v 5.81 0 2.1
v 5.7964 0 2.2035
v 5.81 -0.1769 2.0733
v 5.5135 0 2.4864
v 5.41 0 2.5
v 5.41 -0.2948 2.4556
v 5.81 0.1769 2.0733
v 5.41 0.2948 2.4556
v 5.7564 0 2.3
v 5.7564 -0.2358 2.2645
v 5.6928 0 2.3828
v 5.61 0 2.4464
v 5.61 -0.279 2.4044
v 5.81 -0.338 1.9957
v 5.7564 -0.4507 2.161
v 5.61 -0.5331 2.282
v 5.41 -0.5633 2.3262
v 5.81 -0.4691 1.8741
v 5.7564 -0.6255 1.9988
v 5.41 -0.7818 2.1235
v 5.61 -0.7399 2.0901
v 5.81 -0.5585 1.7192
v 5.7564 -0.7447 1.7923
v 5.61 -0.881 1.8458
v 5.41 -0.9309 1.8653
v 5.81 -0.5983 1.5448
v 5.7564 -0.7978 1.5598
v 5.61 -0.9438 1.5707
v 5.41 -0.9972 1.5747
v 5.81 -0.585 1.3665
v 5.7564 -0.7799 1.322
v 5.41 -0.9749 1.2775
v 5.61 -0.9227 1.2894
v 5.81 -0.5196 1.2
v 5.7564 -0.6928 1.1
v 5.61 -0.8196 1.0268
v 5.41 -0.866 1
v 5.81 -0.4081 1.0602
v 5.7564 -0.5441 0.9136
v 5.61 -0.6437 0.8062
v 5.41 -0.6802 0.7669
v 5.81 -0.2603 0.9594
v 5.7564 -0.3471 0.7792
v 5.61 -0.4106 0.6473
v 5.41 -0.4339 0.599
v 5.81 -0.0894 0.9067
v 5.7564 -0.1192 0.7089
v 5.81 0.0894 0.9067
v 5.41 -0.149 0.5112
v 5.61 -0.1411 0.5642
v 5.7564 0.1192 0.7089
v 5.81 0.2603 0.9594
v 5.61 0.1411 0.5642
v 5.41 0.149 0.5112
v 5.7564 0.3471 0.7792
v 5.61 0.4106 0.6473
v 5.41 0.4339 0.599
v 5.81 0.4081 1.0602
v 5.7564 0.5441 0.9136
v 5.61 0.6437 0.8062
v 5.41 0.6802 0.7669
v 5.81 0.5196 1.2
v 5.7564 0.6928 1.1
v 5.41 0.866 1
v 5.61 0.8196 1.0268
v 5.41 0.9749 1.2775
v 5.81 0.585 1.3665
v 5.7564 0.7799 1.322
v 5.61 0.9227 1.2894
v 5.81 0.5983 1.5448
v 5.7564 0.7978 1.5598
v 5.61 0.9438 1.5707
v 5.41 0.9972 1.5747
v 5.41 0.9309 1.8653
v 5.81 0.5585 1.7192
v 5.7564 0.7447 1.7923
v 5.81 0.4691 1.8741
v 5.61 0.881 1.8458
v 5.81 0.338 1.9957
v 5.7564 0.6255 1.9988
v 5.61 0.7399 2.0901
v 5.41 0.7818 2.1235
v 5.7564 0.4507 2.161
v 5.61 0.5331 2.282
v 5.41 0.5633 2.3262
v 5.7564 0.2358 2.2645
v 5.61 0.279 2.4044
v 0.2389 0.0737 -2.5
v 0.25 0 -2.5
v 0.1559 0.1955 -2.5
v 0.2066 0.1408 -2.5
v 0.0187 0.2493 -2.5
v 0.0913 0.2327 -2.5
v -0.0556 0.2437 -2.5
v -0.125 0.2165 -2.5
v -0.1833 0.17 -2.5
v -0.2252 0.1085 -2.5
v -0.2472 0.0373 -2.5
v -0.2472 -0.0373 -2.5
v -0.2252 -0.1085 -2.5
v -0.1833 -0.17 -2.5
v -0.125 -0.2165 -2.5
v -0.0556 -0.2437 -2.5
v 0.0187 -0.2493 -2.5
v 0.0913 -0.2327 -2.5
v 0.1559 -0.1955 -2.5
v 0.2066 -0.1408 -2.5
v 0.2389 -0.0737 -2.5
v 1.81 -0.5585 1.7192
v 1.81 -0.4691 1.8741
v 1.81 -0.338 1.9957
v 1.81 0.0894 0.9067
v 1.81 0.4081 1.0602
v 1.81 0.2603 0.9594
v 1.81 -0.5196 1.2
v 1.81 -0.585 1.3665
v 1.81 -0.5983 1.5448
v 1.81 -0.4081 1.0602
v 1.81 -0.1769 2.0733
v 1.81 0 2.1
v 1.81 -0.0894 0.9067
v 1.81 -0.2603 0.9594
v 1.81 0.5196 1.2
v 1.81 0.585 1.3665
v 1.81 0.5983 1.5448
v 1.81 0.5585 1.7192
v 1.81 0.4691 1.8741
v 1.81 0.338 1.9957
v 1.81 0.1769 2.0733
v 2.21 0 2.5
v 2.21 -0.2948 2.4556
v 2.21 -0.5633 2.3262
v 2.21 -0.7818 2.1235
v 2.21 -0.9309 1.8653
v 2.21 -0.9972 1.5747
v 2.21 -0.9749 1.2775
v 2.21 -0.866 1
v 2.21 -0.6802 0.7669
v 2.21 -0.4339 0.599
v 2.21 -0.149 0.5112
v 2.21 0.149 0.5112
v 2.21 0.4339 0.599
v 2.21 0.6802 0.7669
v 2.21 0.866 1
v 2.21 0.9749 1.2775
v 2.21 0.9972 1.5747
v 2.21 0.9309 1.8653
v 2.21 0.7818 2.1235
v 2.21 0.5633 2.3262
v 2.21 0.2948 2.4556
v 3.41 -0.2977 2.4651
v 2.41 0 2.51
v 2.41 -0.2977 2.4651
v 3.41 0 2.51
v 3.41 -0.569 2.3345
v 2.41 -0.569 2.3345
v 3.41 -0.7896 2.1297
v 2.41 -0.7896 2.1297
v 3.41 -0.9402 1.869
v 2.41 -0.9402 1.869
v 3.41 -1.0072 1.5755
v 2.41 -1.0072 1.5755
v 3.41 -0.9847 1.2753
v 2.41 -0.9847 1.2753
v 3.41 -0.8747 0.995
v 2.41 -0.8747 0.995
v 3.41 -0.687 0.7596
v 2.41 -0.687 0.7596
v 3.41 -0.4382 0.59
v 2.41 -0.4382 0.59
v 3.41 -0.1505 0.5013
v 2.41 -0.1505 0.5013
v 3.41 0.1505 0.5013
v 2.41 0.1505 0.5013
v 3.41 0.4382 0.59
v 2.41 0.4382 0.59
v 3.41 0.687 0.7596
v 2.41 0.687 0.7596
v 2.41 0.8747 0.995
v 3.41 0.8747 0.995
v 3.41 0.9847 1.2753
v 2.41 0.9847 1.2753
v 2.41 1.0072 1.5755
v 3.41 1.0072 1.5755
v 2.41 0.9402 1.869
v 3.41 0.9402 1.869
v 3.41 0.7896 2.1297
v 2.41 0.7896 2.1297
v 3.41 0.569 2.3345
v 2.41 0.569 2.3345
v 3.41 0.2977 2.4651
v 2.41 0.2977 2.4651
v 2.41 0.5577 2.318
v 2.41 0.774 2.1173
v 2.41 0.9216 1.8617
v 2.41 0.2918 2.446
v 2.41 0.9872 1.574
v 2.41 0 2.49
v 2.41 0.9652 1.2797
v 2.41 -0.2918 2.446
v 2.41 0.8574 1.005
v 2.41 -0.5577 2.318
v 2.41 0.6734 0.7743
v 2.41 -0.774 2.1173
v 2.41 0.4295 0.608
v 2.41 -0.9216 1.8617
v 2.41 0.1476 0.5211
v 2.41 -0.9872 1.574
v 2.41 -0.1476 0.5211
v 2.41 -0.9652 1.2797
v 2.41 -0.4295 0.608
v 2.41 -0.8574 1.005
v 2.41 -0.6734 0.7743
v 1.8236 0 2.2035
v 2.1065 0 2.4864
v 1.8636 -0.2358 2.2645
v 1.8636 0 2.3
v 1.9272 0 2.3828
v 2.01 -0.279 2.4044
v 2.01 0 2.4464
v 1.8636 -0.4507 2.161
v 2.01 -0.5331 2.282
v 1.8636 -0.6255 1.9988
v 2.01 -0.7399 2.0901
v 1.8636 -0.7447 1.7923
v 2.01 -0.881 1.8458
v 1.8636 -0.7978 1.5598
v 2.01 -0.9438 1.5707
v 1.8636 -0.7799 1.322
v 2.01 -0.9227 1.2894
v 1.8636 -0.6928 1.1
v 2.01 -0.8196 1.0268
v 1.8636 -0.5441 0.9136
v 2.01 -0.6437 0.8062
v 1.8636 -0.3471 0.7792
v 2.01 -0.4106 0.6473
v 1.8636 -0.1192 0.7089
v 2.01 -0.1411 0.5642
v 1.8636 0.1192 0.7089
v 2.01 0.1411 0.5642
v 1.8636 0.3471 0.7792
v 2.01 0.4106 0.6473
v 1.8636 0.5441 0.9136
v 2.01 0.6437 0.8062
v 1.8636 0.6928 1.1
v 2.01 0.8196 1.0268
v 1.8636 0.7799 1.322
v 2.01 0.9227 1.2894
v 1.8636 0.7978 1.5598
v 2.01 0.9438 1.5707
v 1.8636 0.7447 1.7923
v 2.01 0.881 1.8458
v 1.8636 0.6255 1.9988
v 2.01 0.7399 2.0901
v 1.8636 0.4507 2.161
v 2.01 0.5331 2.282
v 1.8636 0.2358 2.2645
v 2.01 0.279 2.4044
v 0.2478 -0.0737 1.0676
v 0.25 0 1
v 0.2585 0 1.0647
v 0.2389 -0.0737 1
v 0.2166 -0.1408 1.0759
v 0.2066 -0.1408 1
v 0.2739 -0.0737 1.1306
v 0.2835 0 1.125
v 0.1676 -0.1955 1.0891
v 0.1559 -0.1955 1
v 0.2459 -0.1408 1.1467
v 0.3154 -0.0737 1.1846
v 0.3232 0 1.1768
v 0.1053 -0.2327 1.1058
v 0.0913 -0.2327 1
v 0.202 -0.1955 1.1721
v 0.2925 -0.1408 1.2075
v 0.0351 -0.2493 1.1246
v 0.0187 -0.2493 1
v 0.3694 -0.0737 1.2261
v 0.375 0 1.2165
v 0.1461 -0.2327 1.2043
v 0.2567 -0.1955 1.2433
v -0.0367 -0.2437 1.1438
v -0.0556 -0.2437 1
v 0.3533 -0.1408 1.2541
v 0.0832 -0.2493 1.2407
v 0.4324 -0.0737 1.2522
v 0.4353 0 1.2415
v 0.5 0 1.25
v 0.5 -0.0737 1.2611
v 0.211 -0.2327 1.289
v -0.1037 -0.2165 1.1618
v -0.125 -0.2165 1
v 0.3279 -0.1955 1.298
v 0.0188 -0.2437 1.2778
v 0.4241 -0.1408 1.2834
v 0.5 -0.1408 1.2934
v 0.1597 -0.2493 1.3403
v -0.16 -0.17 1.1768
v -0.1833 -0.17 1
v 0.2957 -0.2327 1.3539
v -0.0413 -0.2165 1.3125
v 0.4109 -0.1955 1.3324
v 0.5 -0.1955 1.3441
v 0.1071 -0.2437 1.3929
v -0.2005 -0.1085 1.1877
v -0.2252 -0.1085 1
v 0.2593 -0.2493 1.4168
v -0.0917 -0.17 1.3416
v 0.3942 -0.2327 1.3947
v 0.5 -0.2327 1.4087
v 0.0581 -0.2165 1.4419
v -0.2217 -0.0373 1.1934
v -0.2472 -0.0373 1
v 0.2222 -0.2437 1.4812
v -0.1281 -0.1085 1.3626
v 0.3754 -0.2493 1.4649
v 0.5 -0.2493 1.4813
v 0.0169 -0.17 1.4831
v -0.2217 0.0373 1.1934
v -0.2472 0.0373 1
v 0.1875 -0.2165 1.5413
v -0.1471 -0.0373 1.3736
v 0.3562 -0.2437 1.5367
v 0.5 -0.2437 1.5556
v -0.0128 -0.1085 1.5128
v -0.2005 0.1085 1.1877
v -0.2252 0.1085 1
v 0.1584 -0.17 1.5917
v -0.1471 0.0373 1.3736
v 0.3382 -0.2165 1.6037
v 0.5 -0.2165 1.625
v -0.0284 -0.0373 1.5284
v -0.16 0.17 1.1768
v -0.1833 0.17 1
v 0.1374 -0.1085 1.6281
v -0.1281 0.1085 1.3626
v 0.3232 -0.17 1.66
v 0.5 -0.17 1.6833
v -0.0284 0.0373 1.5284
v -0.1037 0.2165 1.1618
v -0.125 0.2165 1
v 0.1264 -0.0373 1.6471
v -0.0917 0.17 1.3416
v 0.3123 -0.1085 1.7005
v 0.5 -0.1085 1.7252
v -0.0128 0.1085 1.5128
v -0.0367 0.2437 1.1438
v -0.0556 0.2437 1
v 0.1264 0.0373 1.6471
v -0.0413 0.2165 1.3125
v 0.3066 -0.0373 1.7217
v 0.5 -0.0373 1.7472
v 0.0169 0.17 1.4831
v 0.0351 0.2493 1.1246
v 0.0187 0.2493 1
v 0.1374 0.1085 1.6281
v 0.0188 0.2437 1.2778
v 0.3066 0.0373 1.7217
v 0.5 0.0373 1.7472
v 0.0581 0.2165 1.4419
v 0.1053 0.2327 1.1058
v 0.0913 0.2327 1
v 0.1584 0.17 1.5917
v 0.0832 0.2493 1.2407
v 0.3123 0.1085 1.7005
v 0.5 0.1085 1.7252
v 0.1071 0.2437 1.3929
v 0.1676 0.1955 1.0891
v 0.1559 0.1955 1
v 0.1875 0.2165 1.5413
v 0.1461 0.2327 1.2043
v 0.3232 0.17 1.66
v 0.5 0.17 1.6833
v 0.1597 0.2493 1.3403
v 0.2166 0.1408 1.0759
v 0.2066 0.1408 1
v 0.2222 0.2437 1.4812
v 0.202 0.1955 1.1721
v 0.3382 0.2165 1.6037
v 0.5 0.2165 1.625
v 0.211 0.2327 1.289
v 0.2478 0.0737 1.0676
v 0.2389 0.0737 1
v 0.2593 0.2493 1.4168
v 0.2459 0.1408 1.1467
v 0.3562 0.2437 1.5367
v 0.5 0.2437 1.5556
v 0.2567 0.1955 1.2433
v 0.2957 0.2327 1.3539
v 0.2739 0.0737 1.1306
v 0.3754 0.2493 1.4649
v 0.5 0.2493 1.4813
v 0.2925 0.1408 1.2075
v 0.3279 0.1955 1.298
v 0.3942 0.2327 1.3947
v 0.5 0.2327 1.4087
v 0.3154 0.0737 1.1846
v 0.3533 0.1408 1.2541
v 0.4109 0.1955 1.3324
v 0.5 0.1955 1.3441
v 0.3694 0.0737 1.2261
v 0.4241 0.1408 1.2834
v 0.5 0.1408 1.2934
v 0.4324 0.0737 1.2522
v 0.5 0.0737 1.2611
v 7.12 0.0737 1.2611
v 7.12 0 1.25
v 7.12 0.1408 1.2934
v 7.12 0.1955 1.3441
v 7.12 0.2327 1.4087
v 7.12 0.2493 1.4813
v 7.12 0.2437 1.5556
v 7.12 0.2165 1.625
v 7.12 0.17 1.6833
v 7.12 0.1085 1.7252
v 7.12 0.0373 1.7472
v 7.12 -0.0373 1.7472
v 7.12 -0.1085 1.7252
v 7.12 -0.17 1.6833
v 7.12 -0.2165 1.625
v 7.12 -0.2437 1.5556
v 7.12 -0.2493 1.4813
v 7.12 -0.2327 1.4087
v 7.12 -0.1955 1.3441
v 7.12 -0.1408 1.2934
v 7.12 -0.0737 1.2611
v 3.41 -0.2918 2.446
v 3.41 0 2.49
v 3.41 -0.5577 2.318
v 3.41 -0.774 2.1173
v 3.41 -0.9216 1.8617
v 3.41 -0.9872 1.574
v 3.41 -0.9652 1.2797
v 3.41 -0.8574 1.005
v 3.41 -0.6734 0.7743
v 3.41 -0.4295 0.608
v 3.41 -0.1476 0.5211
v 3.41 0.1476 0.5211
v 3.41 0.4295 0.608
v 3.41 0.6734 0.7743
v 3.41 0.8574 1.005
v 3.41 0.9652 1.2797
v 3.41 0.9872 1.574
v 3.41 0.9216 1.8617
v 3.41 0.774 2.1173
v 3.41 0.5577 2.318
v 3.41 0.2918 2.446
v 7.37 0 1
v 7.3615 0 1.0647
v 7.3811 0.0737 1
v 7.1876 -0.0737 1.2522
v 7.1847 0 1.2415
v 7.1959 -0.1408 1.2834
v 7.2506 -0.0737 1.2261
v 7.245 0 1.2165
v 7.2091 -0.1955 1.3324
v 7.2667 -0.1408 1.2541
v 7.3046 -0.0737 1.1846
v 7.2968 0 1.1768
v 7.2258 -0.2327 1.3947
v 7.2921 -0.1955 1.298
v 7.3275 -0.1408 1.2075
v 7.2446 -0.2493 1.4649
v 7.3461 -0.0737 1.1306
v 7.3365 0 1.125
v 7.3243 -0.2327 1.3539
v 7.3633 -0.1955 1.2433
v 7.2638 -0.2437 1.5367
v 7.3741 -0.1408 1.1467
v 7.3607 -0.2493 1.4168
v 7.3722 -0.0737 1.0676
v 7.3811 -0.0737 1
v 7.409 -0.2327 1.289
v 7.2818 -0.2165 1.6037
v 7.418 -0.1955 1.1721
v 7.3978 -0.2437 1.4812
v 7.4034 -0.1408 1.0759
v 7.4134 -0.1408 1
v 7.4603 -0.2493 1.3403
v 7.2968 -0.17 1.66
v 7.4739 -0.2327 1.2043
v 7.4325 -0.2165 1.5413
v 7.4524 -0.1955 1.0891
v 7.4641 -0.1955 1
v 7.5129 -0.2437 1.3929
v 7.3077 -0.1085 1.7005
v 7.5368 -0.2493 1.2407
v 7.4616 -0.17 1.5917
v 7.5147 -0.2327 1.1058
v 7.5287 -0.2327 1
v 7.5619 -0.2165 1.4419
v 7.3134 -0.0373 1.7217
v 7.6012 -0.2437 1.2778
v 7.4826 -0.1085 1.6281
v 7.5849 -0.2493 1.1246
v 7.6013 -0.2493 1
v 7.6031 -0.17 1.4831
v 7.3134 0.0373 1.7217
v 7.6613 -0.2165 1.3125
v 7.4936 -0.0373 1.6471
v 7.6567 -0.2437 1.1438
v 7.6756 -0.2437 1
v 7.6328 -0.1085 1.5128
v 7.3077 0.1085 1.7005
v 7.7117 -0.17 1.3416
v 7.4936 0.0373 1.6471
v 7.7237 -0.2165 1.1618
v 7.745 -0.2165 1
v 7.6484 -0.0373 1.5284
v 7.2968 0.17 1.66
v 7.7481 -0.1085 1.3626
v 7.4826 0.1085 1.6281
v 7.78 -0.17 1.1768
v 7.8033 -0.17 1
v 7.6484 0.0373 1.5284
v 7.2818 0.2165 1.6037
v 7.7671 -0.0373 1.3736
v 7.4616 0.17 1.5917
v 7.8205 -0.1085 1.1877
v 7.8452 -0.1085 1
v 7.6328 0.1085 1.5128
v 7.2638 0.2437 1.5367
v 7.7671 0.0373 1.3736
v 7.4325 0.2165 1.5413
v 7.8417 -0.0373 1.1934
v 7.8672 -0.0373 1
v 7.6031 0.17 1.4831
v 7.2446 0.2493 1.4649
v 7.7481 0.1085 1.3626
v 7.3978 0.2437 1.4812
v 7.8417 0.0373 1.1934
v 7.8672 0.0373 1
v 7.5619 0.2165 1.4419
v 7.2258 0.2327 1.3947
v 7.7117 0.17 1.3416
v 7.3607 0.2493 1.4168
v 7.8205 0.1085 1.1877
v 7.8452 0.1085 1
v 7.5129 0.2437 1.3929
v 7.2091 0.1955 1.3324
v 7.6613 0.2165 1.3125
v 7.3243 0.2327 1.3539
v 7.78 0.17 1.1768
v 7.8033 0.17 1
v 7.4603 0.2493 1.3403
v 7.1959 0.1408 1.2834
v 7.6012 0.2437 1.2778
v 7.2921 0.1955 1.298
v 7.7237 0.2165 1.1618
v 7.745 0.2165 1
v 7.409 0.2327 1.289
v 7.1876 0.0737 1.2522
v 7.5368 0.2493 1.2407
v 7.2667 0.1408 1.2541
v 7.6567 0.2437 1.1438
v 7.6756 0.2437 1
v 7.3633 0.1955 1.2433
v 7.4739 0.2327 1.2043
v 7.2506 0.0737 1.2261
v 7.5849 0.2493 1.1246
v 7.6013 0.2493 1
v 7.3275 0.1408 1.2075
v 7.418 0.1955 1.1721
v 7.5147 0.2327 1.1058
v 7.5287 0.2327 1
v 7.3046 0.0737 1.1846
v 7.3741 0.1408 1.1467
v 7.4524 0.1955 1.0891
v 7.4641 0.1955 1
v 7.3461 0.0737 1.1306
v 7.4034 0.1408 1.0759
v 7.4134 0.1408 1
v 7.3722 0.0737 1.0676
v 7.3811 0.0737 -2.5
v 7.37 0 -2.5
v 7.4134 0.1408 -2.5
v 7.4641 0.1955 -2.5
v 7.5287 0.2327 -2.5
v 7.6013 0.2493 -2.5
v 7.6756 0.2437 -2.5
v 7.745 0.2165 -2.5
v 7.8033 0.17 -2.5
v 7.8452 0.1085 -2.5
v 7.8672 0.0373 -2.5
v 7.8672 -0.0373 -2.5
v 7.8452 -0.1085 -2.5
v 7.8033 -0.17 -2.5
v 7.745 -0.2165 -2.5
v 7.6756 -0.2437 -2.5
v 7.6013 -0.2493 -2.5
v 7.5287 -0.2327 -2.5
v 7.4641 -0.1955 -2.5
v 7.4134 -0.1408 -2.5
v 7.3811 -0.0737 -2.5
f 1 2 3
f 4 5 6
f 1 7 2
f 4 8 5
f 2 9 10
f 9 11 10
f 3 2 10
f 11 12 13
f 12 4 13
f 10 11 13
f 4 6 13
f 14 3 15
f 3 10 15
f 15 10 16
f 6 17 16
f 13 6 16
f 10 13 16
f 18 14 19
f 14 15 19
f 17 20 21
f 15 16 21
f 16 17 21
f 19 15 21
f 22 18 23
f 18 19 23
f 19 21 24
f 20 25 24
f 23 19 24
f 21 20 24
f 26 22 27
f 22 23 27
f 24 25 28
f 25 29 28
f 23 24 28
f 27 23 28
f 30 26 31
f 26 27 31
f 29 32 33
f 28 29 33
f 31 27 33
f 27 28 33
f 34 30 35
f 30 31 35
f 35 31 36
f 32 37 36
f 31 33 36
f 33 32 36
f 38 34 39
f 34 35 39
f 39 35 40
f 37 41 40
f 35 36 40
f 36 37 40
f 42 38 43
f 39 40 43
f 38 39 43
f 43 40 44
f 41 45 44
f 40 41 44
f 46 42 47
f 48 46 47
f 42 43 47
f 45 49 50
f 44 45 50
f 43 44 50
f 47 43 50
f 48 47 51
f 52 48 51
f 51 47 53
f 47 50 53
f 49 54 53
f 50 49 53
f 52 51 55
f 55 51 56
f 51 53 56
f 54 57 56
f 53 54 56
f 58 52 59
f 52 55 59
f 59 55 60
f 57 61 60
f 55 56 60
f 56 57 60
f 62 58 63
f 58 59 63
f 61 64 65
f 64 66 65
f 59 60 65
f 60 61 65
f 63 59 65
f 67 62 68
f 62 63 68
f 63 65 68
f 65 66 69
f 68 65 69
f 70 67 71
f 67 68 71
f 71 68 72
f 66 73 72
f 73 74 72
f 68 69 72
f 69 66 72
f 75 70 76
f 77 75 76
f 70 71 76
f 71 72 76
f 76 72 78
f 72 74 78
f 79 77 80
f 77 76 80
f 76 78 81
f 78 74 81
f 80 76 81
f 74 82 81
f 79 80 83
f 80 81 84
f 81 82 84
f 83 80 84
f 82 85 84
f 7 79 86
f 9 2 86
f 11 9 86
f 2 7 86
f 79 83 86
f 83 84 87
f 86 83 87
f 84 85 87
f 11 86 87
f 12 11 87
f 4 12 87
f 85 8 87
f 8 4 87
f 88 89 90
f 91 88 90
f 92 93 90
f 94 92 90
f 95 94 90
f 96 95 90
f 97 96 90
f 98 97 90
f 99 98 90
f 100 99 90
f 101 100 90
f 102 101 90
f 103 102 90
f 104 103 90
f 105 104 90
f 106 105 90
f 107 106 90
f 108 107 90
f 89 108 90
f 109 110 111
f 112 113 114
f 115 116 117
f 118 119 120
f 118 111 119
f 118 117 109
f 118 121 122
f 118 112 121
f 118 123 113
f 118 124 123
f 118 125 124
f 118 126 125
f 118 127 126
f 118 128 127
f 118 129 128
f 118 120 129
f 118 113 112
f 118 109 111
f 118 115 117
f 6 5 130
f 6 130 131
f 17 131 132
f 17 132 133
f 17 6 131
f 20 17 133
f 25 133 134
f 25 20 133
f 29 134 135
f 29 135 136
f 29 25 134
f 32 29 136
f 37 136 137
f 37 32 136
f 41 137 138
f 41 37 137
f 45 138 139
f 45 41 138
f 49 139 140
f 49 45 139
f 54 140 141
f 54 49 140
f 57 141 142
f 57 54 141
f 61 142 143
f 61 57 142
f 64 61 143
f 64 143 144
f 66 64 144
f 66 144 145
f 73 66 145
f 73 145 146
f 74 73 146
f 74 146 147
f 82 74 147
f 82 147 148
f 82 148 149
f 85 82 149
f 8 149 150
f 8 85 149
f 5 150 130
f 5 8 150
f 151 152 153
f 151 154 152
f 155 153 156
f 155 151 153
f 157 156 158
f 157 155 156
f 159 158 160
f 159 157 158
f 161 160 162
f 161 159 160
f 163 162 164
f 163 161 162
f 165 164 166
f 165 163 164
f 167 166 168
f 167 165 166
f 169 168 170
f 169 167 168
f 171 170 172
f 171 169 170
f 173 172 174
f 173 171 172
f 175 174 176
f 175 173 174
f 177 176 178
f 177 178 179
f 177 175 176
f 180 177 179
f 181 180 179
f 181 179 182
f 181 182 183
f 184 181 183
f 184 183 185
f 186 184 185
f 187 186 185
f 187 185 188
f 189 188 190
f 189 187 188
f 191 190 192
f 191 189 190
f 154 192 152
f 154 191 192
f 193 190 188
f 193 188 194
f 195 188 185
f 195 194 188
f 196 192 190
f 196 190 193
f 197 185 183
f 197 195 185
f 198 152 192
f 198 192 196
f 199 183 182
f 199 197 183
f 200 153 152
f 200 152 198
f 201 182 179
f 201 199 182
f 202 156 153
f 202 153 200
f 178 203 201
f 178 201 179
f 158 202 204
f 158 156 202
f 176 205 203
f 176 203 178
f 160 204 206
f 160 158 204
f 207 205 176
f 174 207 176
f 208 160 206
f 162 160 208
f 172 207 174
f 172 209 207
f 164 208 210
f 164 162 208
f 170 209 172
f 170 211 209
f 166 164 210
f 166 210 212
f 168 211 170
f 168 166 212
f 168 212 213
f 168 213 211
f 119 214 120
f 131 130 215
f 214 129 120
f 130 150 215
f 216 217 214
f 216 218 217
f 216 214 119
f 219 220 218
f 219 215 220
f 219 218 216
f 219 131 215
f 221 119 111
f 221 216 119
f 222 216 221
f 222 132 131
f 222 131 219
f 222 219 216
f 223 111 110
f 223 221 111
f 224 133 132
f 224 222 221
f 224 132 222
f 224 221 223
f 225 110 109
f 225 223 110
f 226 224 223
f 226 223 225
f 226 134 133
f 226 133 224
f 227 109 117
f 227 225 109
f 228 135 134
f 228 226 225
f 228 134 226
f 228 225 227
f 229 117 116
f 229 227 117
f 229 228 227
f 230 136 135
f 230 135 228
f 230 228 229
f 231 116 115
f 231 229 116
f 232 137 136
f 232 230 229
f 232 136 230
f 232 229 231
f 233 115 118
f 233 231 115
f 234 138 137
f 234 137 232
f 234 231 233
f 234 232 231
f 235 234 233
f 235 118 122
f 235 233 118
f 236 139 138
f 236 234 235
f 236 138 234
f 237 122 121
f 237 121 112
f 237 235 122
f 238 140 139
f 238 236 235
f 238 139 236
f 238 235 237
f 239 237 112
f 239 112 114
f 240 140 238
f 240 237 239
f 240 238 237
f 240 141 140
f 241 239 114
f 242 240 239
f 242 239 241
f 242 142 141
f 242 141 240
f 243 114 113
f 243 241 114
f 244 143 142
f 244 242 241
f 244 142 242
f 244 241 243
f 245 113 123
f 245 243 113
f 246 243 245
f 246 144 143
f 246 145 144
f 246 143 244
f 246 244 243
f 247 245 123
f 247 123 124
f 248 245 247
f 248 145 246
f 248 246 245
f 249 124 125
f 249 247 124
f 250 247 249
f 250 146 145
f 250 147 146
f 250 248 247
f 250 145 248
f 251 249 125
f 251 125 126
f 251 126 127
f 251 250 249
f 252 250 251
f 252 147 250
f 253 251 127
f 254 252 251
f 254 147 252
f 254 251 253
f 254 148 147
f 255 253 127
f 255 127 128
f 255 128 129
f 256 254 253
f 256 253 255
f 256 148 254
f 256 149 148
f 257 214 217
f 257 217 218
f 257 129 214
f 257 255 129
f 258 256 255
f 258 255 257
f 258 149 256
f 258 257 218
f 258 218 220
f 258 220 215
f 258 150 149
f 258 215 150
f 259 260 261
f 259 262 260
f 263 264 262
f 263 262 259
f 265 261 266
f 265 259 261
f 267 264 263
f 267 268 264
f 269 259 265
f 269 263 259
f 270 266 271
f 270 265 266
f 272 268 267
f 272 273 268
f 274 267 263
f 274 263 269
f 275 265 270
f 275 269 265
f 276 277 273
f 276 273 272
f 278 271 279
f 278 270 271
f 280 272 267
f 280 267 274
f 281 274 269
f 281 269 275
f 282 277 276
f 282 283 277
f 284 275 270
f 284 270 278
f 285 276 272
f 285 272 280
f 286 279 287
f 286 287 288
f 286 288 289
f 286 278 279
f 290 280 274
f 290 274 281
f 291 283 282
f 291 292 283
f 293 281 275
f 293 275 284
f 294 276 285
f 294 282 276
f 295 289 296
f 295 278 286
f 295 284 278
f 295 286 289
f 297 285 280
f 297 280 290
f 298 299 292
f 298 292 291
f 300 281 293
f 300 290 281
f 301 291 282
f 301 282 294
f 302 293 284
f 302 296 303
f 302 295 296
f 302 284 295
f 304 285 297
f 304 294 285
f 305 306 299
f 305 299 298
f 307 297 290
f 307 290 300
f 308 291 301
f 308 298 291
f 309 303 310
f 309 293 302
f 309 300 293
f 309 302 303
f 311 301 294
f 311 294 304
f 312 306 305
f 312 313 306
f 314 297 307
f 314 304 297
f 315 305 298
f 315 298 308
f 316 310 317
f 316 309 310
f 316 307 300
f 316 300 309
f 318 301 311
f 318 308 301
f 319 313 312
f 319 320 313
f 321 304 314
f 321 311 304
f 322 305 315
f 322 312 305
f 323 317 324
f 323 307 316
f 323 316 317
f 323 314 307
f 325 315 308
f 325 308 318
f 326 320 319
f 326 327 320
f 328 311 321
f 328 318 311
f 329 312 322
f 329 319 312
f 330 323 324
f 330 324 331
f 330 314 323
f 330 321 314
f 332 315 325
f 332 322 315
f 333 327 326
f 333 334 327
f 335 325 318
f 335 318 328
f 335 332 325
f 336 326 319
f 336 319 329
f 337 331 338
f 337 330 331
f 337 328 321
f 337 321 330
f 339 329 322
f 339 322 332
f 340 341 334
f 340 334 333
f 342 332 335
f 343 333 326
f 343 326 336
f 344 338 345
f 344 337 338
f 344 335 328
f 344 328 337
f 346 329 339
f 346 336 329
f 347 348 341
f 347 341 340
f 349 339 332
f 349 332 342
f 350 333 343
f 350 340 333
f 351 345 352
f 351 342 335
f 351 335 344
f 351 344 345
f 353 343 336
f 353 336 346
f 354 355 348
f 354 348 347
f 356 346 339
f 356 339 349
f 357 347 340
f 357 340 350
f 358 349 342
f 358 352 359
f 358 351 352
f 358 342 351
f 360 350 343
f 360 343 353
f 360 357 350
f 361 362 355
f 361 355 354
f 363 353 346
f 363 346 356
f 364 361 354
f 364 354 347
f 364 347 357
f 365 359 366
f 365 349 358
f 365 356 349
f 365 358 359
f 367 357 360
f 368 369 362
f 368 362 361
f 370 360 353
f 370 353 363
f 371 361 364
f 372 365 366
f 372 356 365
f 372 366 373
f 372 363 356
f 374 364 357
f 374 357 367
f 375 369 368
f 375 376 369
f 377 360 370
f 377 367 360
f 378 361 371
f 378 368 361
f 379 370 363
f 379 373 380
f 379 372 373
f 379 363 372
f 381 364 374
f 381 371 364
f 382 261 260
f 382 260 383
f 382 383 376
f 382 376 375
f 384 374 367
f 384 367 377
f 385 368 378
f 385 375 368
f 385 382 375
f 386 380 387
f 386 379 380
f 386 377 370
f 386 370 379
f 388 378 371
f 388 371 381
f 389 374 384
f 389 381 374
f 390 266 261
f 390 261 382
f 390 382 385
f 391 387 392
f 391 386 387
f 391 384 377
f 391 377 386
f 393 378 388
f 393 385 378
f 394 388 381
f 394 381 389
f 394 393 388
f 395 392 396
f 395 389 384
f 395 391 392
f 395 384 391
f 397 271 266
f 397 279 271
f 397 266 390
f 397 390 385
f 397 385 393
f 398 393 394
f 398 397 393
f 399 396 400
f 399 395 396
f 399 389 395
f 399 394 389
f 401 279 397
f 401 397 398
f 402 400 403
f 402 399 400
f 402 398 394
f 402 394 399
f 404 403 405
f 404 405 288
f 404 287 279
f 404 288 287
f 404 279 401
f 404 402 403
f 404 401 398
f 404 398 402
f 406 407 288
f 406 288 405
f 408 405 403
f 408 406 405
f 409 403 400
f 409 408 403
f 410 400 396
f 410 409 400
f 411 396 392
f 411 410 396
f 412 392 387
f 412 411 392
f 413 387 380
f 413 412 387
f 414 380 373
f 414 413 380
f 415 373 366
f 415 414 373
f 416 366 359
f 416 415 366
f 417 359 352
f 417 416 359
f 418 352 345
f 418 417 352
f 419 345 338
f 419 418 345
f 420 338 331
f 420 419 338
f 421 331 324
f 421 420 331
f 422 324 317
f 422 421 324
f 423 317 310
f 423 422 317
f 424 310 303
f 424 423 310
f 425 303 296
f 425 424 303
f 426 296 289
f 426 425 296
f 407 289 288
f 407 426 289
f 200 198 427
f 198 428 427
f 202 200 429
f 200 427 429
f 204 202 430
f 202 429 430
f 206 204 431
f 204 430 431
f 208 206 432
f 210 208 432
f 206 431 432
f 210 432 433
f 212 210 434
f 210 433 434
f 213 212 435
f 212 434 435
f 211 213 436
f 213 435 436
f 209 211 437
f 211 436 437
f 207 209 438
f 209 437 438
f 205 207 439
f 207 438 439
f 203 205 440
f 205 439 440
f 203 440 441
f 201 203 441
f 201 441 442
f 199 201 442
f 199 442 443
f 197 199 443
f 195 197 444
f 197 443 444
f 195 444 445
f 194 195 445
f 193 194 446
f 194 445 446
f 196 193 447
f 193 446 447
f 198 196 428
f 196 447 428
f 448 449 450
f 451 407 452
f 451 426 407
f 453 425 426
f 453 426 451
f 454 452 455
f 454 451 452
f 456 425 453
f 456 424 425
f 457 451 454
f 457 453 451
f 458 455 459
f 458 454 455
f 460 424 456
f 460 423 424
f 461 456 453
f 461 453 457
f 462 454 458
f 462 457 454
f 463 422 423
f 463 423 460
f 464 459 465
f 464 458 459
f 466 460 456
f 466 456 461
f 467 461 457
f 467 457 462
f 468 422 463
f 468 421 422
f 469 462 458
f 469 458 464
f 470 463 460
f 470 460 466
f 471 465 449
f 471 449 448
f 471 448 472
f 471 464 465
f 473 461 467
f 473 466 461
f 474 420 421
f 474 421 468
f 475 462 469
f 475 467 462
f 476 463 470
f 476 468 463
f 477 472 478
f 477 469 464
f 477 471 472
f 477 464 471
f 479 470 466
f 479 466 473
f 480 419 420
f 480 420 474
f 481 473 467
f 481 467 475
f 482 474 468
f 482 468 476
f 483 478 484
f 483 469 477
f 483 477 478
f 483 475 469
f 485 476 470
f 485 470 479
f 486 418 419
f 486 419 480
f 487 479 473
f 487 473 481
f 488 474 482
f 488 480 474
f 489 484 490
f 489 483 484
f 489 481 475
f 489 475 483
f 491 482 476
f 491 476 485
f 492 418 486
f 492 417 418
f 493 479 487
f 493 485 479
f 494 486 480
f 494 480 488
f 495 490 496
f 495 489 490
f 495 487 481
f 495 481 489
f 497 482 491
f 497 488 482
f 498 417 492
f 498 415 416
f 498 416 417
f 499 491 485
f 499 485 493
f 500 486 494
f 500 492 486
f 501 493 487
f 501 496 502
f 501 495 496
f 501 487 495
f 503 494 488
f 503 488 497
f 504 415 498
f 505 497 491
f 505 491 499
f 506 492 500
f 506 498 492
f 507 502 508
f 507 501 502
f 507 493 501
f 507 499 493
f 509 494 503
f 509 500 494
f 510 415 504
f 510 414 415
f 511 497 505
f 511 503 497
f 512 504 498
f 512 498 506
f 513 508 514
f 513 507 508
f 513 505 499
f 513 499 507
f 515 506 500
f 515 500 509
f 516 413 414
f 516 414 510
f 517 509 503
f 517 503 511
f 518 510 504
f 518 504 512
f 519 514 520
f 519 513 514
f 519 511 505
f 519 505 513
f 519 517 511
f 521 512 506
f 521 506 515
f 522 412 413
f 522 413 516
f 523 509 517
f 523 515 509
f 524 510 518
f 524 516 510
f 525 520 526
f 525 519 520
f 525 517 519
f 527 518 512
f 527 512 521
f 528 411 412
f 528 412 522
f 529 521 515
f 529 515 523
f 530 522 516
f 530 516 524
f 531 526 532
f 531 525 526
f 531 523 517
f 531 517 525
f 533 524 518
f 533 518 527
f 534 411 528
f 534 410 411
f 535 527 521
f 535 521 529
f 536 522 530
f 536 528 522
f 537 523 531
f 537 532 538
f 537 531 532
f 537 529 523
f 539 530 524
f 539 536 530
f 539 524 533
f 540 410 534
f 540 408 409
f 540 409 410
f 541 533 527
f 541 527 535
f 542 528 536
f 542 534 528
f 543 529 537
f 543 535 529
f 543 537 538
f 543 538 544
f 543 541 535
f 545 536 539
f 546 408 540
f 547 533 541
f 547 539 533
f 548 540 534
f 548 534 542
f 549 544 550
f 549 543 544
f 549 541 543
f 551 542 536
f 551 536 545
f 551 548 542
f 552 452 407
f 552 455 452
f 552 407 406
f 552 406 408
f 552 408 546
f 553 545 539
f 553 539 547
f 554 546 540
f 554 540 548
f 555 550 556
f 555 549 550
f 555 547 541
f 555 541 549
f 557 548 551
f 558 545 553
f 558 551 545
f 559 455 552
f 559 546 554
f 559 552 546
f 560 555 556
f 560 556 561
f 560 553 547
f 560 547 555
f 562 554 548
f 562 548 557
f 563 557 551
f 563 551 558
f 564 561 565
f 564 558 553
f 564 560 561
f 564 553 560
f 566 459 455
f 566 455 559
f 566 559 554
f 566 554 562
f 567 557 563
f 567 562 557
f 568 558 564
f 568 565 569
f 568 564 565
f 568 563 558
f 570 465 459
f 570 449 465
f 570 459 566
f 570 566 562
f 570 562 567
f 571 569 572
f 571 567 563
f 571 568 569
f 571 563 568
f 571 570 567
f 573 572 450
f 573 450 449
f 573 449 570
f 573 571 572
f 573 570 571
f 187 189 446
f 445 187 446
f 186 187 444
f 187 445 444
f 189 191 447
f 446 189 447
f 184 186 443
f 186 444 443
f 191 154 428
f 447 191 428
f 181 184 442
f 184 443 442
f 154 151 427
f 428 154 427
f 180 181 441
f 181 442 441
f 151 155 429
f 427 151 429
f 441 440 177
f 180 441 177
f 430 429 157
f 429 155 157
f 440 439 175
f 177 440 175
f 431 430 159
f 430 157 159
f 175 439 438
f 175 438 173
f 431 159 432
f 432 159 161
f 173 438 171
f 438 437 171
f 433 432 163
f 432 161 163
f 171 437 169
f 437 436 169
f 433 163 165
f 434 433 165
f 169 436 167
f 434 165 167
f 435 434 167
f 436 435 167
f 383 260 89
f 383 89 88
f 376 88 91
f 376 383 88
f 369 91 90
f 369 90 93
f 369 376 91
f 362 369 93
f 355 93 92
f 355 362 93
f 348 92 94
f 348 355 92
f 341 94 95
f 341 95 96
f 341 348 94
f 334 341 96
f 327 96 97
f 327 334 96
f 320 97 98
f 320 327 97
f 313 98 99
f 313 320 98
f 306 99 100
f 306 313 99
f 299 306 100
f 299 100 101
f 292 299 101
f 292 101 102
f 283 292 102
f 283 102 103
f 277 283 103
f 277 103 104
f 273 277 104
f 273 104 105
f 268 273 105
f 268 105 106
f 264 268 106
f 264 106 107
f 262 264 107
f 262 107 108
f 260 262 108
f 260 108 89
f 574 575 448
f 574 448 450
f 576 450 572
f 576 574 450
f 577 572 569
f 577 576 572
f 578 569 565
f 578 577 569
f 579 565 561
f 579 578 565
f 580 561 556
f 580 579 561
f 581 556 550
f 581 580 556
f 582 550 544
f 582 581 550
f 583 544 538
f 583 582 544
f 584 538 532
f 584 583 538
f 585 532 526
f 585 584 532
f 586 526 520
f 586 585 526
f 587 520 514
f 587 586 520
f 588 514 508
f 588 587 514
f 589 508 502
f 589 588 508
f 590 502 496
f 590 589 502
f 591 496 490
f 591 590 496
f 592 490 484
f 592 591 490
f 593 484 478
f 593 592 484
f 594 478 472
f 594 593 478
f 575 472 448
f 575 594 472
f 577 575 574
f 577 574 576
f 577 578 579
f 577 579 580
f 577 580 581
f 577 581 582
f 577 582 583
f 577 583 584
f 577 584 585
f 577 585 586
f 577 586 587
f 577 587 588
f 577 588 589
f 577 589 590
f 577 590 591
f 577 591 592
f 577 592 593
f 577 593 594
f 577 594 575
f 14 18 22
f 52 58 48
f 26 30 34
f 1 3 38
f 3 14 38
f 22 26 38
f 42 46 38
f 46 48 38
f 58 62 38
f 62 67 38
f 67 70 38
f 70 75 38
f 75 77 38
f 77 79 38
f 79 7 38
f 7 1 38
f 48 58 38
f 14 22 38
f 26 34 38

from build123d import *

# Parameters (mm, degrees)
SKETCH002_W = 4
SKETCH002_H = 1
FILLET_R    = 0.4
SKETCH003_W = 1
SKETCH003_H = 0.02
SKETCH_R    = 0.25


with BuildPart() as fillet_body:
    # Sketch002 → Revolution (revolve)
    with BuildSketch(Plane.XZ):
        with Locations((3.81, 2)):
            Rectangle(SKETCH002_W, SKETCH002_H)
    revolve(axis=Axis((1.81, 0, 1.5), (1, 0, 0)))

    # Fillet
    fillet_edges = [fillet_body.edges().sort_by_distance(p)[0] for p in [
        (1.81, 0, 0.5),
        (5.81, 0, 0.5),
    ]]
    fillet(fillet_edges, radius=FILLET_R)


with BuildPart() as revolution001:
    # Sketch003 → Revolution001 (revolve)
    with BuildSketch(Plane.XZ):
        with Locations((2.91, 2.5)):
            Rectangle(SKETCH003_W, SKETCH003_H)
    revolve(axis=Axis((0, 0, 1.5), (1, 0, 0)))


with BuildPart() as sweep_body:
    # Sweep: sweep along a path in Sketch001
    with BuildLine(Plane.XZ) as sweep_path:
        Line((0, -2.5), (0, 1))
        ThreePointArc((0, 1), (0.146447, 1.353553), (0.5, 1.5))
        Line((0.5, 1.5), (7.12, 1.5))
        ThreePointArc((7.12, 1.5), (7.473553, 1.353553), (7.62, 1))
        Line((7.62, 1), (7.62, -2.5))
    # Sketch → Sweep (sweep)
    with BuildSketch(Plane.XY.offset(-2)):
        Circle(SKETCH_R)
    sweep(path=sweep_path.line)


solid = Compound([fillet_body.part, revolution001.part, sweep_body.part])
